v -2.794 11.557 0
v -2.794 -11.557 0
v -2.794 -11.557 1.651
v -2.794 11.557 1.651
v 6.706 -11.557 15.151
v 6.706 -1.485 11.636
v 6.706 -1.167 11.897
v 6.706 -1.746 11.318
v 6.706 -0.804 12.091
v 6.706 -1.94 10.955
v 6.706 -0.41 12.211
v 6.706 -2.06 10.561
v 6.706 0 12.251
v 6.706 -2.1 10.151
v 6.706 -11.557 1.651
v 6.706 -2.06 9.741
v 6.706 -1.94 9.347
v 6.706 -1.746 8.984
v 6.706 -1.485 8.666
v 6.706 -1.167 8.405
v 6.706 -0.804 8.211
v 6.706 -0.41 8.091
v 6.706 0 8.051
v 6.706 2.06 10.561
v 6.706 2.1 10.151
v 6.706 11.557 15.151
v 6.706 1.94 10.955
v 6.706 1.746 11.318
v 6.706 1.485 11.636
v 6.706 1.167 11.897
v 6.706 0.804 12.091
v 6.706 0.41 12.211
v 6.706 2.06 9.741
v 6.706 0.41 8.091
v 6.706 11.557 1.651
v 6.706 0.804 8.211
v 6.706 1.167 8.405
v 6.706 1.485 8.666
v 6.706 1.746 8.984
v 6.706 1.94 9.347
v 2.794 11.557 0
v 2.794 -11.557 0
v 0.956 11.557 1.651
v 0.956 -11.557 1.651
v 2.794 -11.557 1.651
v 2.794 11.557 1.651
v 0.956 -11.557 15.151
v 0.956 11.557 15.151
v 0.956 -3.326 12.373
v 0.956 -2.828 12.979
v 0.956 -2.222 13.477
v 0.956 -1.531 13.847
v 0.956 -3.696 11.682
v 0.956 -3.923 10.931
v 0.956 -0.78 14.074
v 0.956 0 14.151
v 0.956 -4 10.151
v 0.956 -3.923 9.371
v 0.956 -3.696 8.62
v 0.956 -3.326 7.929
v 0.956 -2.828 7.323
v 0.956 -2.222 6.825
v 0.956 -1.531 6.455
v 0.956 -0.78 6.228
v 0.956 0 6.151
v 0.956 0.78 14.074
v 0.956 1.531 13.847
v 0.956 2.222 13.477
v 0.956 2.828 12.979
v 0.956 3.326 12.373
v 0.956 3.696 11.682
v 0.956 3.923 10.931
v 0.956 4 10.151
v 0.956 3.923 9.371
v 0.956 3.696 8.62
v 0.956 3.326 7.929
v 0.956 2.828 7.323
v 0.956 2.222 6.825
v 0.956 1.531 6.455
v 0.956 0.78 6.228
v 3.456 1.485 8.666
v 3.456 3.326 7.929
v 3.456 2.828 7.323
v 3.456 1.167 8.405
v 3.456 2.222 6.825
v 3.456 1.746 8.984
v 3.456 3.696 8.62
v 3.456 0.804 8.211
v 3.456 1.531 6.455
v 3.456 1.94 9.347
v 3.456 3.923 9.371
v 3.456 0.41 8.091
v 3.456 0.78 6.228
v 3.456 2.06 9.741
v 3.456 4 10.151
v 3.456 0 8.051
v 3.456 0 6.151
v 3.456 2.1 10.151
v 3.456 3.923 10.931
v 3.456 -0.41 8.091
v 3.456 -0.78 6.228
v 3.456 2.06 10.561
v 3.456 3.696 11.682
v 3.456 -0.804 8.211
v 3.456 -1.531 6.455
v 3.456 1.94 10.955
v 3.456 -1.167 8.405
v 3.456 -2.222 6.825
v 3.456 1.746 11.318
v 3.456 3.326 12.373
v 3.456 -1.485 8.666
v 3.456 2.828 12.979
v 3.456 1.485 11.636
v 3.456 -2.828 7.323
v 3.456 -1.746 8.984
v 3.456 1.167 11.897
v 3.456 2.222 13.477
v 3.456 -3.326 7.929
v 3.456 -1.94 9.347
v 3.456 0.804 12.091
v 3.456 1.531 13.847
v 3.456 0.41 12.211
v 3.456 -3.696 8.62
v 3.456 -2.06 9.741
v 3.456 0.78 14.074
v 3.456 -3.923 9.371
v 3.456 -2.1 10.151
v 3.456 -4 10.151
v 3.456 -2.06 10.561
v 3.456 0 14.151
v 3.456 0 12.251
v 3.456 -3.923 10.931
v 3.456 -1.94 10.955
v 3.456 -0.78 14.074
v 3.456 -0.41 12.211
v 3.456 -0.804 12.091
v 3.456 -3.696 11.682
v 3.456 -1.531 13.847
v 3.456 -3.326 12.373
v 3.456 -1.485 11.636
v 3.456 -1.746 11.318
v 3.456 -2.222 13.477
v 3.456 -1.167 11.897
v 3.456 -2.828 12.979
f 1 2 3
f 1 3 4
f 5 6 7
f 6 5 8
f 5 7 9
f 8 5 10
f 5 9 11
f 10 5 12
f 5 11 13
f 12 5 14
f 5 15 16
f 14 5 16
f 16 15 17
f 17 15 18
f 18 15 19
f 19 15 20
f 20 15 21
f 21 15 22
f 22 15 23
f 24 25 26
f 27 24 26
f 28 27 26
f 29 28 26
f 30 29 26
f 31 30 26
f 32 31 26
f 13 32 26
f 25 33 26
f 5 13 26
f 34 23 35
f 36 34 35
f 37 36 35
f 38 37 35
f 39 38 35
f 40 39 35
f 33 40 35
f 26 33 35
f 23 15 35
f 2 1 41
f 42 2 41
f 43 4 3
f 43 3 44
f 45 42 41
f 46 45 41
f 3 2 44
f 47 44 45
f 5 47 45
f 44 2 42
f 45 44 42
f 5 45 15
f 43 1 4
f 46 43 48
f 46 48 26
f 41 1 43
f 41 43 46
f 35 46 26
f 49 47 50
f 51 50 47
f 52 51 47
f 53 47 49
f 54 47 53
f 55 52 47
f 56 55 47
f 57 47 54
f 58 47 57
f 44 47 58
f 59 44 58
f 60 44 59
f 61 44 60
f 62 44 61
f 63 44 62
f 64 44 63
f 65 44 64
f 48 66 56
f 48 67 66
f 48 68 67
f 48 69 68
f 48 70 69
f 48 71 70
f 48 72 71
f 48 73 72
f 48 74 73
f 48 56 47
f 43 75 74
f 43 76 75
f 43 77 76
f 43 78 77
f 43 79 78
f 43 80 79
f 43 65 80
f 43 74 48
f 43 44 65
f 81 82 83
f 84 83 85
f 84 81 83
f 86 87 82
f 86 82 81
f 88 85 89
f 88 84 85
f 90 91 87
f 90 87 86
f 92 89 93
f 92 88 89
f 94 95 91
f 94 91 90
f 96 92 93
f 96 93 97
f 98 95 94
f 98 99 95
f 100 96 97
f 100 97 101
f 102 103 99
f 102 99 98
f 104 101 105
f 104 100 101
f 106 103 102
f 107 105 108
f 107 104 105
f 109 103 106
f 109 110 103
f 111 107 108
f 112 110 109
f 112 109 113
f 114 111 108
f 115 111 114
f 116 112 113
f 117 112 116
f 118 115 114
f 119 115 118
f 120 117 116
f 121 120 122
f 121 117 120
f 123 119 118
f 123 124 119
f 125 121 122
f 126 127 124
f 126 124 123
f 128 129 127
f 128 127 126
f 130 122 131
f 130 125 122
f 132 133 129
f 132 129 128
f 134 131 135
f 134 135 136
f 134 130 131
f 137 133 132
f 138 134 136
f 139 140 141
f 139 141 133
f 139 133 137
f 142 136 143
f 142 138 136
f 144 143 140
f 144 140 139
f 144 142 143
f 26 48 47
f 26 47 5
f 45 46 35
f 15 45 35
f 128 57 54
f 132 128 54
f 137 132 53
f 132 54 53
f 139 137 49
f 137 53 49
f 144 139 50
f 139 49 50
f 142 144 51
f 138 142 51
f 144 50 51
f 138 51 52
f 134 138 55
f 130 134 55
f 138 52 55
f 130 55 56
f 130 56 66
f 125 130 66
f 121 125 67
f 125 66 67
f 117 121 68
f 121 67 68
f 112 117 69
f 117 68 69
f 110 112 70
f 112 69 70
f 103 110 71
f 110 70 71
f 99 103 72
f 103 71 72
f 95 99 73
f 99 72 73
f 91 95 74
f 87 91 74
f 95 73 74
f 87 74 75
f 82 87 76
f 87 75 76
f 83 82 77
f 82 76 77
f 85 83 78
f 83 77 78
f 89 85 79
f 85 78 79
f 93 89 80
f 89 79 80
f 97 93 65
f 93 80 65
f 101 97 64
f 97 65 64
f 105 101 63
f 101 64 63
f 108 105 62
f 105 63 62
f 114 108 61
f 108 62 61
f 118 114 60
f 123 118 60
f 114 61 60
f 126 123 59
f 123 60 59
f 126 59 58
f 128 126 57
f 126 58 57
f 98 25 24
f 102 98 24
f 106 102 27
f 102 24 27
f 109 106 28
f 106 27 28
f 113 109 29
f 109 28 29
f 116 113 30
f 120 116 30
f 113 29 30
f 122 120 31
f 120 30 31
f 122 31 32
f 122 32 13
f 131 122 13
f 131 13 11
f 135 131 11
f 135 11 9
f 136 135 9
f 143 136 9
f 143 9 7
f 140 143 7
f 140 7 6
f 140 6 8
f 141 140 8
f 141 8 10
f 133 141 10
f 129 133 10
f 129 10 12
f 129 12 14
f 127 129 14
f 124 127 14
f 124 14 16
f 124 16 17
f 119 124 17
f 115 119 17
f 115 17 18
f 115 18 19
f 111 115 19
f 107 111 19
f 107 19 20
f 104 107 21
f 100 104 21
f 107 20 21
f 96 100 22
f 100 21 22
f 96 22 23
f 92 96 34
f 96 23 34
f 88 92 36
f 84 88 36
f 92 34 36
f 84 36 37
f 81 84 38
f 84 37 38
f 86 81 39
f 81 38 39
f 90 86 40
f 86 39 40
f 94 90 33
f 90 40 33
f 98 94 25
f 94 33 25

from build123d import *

# Parameters (mm, degrees)
F0_W     = 5.588
F0_H     = 23.114
F1_DEPTH = 1.651
F2_W     = 5.75
F2_H     = 23.114
F3_DEPTH = 13.5
F4_R     = 2.1
F5_DEPTH = 25.4
F6_R     = 4
F7_DEPTH = 2.5


with BuildPart() as f1:
    # F0 (on Top) → F1 (new body)
    with BuildSketch(Plane.XY):
        Rectangle(F0_W, F0_H)
    extrude(amount=F1_DEPTH)

    # F2 (on face) → F3 (join)
    with BuildSketch(Plane.XY.offset(1.651)):
        with Locations((3.831, 0)):
            Rectangle(F2_W, F2_H)
    extrude(amount=F3_DEPTH)

    # F4 (on face) → F5 (cut)
    with BuildSketch(Plane.YZ.offset(6.706)):
        with Locations((0, 10.151)):
            Circle(F4_R)
    extrude(amount=-F5_DEPTH, mode=Mode.SUBTRACT)

    # F6 (on face) → F7 (cut)
    with BuildSketch(Plane(origin=(0.956, 0, 0), x_dir=(0, -1, 0), z_dir=(-1, 0, 0))):
        with Locations((0, 10.151)):
            Circle(F6_R)
    extrude(amount=-F7_DEPTH, mode=Mode.SUBTRACT)


solid = f1.part
